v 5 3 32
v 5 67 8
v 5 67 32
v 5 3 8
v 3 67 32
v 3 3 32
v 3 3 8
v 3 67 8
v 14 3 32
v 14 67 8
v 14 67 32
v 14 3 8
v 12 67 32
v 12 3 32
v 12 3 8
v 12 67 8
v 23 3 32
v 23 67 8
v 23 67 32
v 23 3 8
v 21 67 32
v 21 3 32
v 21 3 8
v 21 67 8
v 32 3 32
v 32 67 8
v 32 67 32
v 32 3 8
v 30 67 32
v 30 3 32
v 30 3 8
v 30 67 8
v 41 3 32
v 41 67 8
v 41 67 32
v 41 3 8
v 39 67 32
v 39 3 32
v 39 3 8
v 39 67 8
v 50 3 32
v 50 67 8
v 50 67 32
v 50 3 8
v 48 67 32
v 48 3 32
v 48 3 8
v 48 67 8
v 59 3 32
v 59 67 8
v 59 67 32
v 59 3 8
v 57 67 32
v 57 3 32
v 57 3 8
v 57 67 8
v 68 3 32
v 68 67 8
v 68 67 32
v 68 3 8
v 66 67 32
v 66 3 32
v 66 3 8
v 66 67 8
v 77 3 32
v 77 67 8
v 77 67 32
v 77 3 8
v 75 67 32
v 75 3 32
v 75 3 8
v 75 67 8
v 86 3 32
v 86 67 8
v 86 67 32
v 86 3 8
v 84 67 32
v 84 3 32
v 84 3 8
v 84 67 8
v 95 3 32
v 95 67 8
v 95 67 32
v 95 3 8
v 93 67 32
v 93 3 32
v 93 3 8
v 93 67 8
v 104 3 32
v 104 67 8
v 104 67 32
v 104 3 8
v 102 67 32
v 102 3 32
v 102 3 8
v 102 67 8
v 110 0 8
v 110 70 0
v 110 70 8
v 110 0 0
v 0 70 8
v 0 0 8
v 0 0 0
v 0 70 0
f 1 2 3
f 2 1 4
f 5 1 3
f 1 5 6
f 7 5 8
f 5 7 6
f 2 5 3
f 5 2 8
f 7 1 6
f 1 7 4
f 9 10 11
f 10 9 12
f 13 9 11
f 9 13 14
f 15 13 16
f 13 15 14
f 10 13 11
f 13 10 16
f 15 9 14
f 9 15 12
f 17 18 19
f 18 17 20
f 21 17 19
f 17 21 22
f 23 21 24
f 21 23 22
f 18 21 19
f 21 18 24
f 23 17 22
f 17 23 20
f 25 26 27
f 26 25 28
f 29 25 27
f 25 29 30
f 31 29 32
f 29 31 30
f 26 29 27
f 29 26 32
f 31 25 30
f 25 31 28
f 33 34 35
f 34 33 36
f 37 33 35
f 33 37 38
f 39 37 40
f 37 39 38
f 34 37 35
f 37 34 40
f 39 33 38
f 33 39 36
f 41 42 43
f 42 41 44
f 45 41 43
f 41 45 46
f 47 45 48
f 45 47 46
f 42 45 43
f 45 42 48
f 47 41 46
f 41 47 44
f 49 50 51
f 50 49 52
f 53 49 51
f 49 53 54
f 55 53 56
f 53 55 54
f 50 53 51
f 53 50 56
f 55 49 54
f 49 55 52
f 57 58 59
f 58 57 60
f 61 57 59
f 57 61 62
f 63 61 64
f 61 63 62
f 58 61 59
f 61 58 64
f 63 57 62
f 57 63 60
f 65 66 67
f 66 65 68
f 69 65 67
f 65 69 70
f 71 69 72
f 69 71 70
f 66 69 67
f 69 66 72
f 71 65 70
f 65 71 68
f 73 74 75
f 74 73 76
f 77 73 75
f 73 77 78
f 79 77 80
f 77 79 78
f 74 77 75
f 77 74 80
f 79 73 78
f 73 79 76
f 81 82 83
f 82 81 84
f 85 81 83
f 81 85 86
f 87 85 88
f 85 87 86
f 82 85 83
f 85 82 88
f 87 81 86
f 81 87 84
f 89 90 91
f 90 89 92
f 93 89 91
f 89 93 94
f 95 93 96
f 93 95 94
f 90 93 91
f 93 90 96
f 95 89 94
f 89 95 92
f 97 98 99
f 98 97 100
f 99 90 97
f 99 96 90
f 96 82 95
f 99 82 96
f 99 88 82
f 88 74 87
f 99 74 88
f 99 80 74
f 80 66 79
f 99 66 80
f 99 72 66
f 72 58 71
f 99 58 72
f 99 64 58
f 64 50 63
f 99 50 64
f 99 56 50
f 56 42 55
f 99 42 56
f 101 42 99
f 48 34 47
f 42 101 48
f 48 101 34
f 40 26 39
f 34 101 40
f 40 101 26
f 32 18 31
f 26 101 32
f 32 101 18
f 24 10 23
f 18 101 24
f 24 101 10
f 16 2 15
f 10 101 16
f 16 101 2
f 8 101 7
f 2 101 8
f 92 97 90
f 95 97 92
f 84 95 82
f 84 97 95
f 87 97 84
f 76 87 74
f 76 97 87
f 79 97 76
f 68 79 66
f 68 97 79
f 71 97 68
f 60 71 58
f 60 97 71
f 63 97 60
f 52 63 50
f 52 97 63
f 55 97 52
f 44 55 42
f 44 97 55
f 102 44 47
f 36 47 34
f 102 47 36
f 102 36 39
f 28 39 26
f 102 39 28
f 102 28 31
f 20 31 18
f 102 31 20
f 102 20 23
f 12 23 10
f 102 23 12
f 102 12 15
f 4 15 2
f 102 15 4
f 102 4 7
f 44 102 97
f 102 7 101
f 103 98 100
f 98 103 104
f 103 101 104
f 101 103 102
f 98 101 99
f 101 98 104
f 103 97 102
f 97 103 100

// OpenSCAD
$fn = 32;

// ----------------------------------------------------------------------
// Heatsink: uniform fin block
// ----------------------------------------------------------------------

// --- parameters (mm) ---
base_l = 110;             // base length, X
base_w = 70;              // base width, Y
base_t = 8;               // base plate thickness
fin_h = 25;               // fin height above the base
fin_t = 2;                // fin thickness
edge = 3;                 // margin from the base ends
pitch = 9;                // fin pitch

n_fins = floor((base_l - 2 * edge - fin_t) / pitch) + 1;  // fin count
total_h = base_t + fin_h - 1;  // overall height

union() {
  cube([base_l, base_w, base_t]);
  for (i = [0 : n_fins - 1])
    translate([edge + i * pitch, edge, base_t - 1])
      cube([fin_t, base_w - 2 * edge, fin_h]);
}
